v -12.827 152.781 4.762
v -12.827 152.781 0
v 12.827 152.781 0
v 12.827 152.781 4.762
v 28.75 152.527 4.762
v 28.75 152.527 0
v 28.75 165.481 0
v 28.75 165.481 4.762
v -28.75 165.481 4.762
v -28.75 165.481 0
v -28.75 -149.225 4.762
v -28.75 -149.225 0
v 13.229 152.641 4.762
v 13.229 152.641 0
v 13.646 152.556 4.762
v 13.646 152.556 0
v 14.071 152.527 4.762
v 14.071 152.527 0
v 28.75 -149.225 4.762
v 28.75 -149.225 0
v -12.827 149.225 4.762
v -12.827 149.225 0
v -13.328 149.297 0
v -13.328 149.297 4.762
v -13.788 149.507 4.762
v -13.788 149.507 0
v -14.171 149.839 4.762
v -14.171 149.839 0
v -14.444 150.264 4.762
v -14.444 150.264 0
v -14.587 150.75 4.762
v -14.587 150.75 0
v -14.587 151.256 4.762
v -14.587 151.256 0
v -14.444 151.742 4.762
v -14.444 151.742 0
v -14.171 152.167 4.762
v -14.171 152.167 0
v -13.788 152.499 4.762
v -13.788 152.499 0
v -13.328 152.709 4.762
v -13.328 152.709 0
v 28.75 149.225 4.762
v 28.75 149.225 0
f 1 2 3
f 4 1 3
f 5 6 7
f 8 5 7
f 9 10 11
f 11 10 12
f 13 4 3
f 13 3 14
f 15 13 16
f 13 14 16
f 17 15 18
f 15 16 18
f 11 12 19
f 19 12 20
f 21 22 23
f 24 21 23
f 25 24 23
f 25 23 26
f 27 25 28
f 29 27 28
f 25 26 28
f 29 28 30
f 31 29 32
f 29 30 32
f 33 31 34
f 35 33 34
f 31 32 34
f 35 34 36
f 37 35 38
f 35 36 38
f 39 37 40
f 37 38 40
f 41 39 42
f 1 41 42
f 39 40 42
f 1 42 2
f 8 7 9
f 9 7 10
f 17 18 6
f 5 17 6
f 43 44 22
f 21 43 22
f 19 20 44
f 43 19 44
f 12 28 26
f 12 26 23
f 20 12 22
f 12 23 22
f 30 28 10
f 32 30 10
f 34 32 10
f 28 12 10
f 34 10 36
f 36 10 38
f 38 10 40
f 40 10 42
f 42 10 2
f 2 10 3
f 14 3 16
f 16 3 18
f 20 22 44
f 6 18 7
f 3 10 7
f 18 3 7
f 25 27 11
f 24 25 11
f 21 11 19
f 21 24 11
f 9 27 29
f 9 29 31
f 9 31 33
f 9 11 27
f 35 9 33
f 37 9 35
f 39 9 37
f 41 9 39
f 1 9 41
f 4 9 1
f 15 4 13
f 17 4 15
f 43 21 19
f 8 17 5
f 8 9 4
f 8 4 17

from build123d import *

# Parameters (mm, degrees)
BOSS_EXTRUDE1_DEPTH = 4.7625
FILLET1_R           = 3.175


with BuildPart() as part:
    # Sketch1 → Boss-Extrude1 (new body)
    with BuildSketch(Plane.XY):
        with BuildLine():
            Line((-28.75, 165.481), (-28.75, 149.225))
            Line((-28.75, 149.225), (-12.827, 149.225))
            ThreePointArc((-12.827, 149.225), (-14.605, 151.003), (-12.827, 152.781))
            Line((-12.827, 152.781), (12.827, 152.781))
            Line((12.827, 152.781), (12.827, 152.527))
            Line((12.827, 152.527), (28.75, 152.527))
            Line((28.75, 152.527), (28.75, 165.481))
            Line((28.75, 165.481), (-28.75, 165.481))
        make_face()
        Polygon((-12.827, 149.225), (-28.75, 149.225), (-28.75, -149.225), (28.75, -149.225), (28.75, 149.225), align=None)
    extrude(amount=BOSS_EXTRUDE1_DEPTH)

    # Fillet1
    # the kernel refuses this fillet: 3.175 mm, written as the material it takes off along each edge
    with BuildSketch(Plane(origin=(12.827, 152.527, -3.110851973), x_dir=(1, 0, 0), z_dir=(0, 0, 1))) as fillet1_piece_1:
        with BuildLine():
            CenterArc((1.244340789, 3.175), FILLET1_R, 246.926081934, 23.073918066)
            Line((0, 0.254), (-0.024886816, 0.19558))
            ThreePointArc((-0.024886816, 0.19558), (-0.0635, 0.127), (-0.0635, 0))
            Line((-0.0635, 0), (0, -0.0635))
            Line((0, -0.0635), (1.244340789, -0.0635))
            Line((1.244340789, -0.0635), (1.244340789, 0))
        make_face()
    extrude(amount=10.984203947, mode=Mode.SUBTRACT)


solid = part.part
